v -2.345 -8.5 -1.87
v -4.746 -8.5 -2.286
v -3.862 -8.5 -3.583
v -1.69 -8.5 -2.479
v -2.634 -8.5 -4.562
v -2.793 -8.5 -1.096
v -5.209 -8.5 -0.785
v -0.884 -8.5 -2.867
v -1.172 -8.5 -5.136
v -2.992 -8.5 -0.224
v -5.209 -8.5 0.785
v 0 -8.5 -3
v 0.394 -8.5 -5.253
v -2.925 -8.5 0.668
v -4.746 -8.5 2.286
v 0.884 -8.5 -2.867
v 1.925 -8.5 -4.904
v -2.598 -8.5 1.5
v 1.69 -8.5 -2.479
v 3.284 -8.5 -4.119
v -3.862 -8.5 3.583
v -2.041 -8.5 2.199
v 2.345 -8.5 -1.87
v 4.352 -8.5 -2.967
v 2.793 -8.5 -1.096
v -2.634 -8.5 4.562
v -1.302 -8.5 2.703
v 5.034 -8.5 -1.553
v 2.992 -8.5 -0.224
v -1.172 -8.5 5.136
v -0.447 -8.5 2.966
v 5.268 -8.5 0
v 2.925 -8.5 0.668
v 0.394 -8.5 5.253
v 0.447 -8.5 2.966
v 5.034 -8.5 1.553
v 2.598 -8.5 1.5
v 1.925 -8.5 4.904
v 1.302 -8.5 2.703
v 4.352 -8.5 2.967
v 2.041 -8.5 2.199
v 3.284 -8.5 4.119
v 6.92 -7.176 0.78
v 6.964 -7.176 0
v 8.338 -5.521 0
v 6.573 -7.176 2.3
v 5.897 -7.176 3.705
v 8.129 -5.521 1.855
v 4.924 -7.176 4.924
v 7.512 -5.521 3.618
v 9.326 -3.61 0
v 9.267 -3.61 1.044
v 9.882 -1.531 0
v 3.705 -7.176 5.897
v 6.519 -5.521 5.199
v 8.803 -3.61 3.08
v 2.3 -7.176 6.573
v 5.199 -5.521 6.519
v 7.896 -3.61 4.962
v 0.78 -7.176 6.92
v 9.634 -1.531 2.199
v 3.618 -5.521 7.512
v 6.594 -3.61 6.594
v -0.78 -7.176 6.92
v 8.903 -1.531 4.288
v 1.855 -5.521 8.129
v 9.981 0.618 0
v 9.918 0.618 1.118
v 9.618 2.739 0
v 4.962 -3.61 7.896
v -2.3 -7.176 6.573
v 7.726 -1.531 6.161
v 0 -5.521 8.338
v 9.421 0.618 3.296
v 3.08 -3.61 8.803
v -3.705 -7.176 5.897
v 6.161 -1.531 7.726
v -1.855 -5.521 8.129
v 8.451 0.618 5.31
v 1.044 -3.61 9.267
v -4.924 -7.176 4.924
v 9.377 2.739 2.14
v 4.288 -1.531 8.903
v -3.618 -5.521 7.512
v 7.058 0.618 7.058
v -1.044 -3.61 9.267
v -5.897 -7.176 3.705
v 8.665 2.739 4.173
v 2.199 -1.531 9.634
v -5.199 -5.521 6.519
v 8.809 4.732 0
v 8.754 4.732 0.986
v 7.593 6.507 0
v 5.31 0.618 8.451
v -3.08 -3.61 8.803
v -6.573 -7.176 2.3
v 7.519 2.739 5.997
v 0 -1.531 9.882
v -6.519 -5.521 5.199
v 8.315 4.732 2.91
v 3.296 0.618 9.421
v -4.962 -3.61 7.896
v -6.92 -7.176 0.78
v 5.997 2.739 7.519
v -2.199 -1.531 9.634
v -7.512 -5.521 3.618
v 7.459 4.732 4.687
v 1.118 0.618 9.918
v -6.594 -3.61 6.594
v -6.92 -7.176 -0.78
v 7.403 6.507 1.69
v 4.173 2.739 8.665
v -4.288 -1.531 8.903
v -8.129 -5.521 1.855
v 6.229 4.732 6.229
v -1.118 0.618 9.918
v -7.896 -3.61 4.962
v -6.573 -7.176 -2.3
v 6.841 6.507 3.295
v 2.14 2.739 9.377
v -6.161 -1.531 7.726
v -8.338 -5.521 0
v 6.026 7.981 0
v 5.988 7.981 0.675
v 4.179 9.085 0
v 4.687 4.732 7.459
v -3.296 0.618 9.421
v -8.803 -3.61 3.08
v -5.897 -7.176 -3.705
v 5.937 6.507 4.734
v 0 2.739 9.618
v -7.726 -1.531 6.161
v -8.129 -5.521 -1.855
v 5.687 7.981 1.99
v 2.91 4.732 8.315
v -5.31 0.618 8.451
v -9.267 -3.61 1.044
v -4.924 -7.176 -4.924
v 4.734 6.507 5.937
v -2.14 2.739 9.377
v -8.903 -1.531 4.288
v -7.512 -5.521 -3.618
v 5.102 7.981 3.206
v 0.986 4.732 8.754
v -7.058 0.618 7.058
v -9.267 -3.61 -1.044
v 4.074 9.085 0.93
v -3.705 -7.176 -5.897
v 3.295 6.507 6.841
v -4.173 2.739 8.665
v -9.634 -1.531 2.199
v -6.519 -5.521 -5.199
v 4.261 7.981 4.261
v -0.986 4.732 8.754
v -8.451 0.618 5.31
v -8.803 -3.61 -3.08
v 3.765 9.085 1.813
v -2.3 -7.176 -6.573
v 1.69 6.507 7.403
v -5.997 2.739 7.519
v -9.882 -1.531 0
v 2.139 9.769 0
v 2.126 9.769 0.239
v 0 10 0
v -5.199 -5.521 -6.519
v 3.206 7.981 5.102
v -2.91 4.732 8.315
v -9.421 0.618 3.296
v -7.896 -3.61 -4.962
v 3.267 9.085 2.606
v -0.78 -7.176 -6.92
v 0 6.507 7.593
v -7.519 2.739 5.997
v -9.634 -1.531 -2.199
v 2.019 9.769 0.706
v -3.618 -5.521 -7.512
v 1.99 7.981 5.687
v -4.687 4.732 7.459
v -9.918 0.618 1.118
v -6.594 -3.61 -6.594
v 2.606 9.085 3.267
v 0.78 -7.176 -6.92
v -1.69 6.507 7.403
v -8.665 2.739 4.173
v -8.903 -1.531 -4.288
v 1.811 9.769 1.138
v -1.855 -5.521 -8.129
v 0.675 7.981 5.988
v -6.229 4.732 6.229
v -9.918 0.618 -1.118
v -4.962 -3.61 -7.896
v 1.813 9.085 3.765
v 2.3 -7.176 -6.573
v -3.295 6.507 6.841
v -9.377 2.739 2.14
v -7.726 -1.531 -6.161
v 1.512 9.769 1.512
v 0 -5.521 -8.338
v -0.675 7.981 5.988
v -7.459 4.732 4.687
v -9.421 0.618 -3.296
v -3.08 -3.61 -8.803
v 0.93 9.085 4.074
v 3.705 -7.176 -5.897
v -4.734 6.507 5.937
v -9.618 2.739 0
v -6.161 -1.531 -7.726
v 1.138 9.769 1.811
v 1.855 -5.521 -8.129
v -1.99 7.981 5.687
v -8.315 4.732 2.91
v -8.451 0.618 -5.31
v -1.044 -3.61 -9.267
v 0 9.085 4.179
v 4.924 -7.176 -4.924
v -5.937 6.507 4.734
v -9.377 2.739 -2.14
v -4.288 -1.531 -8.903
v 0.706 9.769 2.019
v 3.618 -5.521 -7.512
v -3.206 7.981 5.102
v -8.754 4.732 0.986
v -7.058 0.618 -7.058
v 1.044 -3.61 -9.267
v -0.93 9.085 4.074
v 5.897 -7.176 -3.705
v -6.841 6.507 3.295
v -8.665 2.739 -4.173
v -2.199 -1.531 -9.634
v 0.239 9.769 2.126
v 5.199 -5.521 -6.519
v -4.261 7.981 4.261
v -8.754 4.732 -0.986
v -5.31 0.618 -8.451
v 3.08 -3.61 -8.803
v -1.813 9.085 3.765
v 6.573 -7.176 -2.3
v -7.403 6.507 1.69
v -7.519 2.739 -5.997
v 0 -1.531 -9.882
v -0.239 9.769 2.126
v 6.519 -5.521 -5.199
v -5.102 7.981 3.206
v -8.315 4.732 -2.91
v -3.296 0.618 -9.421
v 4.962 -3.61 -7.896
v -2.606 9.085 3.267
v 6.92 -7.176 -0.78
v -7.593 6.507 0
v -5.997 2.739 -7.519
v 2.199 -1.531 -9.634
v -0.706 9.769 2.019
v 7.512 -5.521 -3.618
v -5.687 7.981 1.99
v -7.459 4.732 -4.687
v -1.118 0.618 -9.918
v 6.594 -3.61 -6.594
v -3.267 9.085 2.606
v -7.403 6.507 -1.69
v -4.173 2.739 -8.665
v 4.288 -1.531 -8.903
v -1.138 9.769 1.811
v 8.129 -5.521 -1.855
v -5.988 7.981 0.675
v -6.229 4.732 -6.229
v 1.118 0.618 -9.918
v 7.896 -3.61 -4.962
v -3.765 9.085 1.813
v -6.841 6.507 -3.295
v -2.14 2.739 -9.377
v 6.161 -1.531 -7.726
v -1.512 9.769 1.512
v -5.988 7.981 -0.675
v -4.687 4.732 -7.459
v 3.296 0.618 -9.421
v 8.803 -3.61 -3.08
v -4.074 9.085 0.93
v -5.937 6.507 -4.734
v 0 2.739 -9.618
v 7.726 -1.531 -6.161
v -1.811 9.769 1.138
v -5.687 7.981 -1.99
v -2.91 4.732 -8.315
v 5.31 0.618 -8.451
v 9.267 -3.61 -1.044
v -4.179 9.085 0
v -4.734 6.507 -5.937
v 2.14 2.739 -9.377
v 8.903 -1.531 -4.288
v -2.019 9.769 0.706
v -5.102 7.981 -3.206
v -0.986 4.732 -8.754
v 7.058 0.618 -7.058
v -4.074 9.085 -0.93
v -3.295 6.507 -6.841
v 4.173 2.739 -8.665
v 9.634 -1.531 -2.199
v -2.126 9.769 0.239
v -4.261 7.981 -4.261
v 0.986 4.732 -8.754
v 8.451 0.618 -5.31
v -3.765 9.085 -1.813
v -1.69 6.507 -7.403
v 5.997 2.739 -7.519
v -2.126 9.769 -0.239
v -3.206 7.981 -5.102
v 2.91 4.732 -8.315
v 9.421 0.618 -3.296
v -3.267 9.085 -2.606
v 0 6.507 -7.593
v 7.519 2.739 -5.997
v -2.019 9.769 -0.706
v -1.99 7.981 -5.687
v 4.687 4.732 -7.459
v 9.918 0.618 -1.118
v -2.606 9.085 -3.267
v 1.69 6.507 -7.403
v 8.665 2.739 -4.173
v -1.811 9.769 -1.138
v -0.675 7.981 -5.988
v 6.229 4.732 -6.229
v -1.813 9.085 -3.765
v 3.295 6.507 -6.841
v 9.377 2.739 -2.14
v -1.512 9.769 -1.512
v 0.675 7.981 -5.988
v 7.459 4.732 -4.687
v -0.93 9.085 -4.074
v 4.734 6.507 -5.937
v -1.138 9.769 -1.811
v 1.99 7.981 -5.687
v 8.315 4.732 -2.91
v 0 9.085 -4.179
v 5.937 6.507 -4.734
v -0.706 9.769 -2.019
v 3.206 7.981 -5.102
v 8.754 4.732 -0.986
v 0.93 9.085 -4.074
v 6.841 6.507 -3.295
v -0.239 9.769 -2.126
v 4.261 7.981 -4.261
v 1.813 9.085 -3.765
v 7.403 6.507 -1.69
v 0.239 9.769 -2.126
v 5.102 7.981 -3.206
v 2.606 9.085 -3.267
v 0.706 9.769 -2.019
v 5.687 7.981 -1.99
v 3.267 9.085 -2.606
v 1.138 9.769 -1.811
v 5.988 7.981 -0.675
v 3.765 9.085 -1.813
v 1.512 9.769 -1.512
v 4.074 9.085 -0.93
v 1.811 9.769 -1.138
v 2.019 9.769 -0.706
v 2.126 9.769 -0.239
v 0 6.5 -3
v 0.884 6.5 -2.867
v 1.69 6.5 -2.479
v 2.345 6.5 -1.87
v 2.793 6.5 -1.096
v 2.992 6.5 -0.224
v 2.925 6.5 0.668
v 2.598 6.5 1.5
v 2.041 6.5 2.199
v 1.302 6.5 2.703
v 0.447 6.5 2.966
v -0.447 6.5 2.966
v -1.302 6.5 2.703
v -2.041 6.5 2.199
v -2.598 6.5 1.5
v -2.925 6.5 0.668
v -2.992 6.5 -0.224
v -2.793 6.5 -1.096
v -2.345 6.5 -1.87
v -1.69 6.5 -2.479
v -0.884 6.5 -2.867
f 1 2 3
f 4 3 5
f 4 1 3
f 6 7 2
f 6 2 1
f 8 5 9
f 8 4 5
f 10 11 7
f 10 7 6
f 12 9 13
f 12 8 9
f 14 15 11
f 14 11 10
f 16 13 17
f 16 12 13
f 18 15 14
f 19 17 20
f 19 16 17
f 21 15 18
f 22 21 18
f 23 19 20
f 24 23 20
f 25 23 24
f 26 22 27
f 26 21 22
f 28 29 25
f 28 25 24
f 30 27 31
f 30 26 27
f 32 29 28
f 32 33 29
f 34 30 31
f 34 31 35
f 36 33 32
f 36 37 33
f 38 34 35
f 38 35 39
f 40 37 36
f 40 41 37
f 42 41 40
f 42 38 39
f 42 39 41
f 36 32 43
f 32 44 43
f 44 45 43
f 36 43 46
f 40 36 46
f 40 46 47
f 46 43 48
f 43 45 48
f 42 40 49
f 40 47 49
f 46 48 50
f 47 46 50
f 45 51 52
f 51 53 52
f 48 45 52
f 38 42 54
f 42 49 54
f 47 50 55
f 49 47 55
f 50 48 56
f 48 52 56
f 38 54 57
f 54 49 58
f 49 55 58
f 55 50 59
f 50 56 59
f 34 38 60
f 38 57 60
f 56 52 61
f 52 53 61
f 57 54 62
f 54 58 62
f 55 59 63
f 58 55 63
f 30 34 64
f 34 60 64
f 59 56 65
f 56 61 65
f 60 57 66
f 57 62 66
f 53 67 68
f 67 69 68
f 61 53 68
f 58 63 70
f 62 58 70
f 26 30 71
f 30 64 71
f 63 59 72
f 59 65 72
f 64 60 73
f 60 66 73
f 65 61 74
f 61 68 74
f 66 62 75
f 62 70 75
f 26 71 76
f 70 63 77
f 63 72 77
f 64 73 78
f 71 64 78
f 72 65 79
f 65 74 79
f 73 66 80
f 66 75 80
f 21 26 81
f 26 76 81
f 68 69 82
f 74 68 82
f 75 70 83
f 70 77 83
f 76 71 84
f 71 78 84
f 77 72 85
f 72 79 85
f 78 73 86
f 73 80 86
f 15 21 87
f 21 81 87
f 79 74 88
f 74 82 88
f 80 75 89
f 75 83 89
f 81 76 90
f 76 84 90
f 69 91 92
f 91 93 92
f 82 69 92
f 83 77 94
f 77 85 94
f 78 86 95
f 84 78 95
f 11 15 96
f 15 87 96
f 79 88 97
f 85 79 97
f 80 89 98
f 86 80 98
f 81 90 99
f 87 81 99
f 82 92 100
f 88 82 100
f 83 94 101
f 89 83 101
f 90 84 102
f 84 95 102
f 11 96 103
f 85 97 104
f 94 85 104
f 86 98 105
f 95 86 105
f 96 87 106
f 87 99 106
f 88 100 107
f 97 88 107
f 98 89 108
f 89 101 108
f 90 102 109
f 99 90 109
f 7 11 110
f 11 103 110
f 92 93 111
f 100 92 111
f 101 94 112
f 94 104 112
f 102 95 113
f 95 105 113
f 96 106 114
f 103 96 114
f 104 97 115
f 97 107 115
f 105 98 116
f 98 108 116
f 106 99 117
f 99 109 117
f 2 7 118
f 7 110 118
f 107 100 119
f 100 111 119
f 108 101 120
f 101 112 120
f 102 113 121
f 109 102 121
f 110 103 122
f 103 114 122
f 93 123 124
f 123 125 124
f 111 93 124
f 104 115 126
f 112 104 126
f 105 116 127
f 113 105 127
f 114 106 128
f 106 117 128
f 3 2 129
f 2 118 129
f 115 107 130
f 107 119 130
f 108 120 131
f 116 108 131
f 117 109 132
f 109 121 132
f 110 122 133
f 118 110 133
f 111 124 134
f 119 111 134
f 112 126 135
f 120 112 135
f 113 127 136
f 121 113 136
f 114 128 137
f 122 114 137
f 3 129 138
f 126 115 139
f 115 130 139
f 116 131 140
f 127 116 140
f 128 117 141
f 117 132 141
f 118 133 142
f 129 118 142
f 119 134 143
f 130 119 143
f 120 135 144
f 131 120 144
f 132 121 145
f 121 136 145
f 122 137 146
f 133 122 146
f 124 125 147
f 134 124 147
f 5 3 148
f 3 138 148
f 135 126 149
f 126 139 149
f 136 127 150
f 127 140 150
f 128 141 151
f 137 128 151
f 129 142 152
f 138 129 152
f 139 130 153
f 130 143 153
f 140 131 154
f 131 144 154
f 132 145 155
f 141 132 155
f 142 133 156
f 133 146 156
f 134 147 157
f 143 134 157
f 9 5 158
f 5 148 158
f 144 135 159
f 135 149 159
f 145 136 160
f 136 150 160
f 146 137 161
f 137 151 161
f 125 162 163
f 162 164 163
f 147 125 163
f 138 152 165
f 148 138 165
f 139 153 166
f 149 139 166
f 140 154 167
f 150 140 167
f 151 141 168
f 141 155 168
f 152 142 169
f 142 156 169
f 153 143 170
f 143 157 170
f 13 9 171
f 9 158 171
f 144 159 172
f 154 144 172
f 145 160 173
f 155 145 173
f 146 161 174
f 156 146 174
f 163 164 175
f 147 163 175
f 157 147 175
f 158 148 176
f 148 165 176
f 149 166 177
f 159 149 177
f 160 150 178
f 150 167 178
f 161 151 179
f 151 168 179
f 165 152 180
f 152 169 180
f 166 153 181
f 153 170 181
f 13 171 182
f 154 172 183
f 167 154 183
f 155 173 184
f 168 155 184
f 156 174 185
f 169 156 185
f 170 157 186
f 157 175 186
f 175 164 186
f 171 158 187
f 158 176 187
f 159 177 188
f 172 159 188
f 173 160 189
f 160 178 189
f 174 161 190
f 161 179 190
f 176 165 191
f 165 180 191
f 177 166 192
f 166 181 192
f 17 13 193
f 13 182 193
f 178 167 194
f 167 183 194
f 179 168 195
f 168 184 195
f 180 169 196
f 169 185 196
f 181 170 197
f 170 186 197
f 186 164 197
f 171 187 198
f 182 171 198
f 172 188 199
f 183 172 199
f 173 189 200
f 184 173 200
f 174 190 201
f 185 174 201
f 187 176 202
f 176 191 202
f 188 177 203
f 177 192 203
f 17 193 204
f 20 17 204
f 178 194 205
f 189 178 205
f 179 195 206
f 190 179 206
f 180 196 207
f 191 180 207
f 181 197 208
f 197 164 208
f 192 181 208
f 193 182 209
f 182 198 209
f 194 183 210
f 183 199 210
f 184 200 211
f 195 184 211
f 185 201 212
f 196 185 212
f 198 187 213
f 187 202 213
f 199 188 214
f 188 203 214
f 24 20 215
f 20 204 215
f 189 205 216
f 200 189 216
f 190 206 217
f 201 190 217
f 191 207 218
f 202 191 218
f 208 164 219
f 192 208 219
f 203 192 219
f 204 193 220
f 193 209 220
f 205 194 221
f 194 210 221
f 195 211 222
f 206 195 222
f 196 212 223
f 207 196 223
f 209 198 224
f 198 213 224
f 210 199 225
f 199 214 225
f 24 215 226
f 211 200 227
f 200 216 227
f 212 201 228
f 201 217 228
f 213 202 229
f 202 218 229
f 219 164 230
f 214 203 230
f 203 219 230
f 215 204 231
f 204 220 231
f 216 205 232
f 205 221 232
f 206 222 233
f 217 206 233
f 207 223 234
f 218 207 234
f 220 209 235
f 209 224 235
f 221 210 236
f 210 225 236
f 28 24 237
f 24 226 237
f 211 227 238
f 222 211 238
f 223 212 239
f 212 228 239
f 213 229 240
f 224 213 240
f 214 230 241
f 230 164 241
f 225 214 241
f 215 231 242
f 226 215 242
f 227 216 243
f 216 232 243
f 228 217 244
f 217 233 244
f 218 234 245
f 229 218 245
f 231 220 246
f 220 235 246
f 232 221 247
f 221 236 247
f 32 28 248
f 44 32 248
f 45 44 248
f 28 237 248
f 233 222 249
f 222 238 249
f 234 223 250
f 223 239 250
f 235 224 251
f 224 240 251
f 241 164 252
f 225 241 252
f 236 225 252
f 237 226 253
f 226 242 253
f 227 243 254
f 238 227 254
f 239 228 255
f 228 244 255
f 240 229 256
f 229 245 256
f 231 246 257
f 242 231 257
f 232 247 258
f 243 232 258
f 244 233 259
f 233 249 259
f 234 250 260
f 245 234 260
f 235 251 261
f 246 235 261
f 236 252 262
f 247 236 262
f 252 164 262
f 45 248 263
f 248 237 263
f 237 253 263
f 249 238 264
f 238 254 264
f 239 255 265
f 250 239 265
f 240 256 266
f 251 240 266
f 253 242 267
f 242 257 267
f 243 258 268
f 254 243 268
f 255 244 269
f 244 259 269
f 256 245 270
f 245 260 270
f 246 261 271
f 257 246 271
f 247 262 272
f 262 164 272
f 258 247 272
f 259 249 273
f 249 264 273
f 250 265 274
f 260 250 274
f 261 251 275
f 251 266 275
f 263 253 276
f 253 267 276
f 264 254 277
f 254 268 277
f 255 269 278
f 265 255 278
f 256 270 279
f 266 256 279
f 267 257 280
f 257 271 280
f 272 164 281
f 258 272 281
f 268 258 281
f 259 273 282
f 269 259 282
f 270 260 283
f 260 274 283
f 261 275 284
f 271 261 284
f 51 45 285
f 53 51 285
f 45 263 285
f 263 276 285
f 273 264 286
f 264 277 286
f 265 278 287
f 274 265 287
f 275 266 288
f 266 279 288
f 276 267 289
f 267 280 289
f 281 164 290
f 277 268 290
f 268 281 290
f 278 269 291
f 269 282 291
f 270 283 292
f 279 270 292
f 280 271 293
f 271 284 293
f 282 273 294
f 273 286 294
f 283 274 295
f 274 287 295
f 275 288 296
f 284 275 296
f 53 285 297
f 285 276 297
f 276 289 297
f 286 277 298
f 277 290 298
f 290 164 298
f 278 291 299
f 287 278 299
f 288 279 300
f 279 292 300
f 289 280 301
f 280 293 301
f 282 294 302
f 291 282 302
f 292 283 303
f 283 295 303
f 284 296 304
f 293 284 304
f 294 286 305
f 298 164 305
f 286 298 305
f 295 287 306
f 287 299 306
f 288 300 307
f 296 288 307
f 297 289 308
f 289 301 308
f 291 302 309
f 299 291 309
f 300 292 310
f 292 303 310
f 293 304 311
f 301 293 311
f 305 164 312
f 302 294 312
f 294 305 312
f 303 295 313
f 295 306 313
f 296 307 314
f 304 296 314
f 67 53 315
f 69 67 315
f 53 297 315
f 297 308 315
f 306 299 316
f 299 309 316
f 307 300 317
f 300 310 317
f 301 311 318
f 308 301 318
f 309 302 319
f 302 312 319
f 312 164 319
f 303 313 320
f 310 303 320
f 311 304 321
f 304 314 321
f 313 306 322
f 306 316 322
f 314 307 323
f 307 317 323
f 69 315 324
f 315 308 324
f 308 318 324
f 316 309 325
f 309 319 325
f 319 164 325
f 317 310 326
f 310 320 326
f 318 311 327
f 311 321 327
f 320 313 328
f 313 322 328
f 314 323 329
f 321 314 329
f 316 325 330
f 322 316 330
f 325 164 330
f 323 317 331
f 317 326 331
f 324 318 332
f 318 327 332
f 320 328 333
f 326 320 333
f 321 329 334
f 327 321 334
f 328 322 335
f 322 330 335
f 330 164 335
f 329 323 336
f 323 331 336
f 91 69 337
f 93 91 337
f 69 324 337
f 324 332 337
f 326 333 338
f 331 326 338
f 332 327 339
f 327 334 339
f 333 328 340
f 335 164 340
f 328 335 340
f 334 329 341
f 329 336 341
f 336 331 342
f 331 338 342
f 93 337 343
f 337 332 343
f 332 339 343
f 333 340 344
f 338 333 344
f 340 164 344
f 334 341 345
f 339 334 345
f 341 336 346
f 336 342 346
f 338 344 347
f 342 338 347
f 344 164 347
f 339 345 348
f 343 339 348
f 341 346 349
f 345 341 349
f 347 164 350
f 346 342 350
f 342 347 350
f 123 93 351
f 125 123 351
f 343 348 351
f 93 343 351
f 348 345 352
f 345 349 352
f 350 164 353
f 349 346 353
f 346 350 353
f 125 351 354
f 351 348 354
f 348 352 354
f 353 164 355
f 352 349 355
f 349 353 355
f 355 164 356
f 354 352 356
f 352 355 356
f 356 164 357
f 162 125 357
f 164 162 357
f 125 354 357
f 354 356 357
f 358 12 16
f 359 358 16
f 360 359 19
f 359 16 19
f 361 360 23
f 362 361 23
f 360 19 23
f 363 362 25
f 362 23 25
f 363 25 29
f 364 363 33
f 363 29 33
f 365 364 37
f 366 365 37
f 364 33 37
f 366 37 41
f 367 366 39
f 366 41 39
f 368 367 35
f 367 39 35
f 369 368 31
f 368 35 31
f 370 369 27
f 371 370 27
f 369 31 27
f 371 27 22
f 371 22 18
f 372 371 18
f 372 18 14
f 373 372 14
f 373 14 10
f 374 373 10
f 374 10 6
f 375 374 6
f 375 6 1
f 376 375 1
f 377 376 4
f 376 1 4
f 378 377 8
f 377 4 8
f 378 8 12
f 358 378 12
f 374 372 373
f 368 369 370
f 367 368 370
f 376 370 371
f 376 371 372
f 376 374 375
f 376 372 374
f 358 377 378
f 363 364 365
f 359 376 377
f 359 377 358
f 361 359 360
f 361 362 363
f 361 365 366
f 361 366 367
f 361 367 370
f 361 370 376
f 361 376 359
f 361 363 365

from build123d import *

# Parameters (mm, degrees)
SKETCH_2_W          = 12
SKETCH_2_H          = 3
CUT_EXTRUDE_1_DEPTH = 6
SKETCH_3_R          = 3
CUT_EXTRUDE_2_DEPTH = 15


with BuildPart() as part:
    # Эскиз1 → Revolve 273 (revolve)
    with BuildSketch(Plane.XY):
        with BuildLine():
            Line((0, 10), (0, 0))
            Line((0, 0), (0, -10))
            ThreePointArc((0, -10), (10, 0), (0, 10))
        make_face()
    revolve(axis=Axis((0, 10, 0), (0, -1, 0)))

    # Эскиз2 → Вырез-Вытянуть1 (cut, symmetric)
    with BuildSketch(Plane.XY):
        with Locations((0, -10)):
            Rectangle(SKETCH_2_W, SKETCH_2_H)
    extrude(amount=CUT_EXTRUDE_1_DEPTH, both=True, mode=Mode.SUBTRACT)

    # Эскиз3 → Вырез-Вытянуть2 (cut)
    with BuildSketch(Plane.XZ.offset(8.5)):
        with Locations(Location((0, 0, 0), (0, 0, 270))):
            Circle(SKETCH_3_R)
    extrude(amount=-CUT_EXTRUDE_2_DEPTH, mode=Mode.SUBTRACT)


solid = part.part
